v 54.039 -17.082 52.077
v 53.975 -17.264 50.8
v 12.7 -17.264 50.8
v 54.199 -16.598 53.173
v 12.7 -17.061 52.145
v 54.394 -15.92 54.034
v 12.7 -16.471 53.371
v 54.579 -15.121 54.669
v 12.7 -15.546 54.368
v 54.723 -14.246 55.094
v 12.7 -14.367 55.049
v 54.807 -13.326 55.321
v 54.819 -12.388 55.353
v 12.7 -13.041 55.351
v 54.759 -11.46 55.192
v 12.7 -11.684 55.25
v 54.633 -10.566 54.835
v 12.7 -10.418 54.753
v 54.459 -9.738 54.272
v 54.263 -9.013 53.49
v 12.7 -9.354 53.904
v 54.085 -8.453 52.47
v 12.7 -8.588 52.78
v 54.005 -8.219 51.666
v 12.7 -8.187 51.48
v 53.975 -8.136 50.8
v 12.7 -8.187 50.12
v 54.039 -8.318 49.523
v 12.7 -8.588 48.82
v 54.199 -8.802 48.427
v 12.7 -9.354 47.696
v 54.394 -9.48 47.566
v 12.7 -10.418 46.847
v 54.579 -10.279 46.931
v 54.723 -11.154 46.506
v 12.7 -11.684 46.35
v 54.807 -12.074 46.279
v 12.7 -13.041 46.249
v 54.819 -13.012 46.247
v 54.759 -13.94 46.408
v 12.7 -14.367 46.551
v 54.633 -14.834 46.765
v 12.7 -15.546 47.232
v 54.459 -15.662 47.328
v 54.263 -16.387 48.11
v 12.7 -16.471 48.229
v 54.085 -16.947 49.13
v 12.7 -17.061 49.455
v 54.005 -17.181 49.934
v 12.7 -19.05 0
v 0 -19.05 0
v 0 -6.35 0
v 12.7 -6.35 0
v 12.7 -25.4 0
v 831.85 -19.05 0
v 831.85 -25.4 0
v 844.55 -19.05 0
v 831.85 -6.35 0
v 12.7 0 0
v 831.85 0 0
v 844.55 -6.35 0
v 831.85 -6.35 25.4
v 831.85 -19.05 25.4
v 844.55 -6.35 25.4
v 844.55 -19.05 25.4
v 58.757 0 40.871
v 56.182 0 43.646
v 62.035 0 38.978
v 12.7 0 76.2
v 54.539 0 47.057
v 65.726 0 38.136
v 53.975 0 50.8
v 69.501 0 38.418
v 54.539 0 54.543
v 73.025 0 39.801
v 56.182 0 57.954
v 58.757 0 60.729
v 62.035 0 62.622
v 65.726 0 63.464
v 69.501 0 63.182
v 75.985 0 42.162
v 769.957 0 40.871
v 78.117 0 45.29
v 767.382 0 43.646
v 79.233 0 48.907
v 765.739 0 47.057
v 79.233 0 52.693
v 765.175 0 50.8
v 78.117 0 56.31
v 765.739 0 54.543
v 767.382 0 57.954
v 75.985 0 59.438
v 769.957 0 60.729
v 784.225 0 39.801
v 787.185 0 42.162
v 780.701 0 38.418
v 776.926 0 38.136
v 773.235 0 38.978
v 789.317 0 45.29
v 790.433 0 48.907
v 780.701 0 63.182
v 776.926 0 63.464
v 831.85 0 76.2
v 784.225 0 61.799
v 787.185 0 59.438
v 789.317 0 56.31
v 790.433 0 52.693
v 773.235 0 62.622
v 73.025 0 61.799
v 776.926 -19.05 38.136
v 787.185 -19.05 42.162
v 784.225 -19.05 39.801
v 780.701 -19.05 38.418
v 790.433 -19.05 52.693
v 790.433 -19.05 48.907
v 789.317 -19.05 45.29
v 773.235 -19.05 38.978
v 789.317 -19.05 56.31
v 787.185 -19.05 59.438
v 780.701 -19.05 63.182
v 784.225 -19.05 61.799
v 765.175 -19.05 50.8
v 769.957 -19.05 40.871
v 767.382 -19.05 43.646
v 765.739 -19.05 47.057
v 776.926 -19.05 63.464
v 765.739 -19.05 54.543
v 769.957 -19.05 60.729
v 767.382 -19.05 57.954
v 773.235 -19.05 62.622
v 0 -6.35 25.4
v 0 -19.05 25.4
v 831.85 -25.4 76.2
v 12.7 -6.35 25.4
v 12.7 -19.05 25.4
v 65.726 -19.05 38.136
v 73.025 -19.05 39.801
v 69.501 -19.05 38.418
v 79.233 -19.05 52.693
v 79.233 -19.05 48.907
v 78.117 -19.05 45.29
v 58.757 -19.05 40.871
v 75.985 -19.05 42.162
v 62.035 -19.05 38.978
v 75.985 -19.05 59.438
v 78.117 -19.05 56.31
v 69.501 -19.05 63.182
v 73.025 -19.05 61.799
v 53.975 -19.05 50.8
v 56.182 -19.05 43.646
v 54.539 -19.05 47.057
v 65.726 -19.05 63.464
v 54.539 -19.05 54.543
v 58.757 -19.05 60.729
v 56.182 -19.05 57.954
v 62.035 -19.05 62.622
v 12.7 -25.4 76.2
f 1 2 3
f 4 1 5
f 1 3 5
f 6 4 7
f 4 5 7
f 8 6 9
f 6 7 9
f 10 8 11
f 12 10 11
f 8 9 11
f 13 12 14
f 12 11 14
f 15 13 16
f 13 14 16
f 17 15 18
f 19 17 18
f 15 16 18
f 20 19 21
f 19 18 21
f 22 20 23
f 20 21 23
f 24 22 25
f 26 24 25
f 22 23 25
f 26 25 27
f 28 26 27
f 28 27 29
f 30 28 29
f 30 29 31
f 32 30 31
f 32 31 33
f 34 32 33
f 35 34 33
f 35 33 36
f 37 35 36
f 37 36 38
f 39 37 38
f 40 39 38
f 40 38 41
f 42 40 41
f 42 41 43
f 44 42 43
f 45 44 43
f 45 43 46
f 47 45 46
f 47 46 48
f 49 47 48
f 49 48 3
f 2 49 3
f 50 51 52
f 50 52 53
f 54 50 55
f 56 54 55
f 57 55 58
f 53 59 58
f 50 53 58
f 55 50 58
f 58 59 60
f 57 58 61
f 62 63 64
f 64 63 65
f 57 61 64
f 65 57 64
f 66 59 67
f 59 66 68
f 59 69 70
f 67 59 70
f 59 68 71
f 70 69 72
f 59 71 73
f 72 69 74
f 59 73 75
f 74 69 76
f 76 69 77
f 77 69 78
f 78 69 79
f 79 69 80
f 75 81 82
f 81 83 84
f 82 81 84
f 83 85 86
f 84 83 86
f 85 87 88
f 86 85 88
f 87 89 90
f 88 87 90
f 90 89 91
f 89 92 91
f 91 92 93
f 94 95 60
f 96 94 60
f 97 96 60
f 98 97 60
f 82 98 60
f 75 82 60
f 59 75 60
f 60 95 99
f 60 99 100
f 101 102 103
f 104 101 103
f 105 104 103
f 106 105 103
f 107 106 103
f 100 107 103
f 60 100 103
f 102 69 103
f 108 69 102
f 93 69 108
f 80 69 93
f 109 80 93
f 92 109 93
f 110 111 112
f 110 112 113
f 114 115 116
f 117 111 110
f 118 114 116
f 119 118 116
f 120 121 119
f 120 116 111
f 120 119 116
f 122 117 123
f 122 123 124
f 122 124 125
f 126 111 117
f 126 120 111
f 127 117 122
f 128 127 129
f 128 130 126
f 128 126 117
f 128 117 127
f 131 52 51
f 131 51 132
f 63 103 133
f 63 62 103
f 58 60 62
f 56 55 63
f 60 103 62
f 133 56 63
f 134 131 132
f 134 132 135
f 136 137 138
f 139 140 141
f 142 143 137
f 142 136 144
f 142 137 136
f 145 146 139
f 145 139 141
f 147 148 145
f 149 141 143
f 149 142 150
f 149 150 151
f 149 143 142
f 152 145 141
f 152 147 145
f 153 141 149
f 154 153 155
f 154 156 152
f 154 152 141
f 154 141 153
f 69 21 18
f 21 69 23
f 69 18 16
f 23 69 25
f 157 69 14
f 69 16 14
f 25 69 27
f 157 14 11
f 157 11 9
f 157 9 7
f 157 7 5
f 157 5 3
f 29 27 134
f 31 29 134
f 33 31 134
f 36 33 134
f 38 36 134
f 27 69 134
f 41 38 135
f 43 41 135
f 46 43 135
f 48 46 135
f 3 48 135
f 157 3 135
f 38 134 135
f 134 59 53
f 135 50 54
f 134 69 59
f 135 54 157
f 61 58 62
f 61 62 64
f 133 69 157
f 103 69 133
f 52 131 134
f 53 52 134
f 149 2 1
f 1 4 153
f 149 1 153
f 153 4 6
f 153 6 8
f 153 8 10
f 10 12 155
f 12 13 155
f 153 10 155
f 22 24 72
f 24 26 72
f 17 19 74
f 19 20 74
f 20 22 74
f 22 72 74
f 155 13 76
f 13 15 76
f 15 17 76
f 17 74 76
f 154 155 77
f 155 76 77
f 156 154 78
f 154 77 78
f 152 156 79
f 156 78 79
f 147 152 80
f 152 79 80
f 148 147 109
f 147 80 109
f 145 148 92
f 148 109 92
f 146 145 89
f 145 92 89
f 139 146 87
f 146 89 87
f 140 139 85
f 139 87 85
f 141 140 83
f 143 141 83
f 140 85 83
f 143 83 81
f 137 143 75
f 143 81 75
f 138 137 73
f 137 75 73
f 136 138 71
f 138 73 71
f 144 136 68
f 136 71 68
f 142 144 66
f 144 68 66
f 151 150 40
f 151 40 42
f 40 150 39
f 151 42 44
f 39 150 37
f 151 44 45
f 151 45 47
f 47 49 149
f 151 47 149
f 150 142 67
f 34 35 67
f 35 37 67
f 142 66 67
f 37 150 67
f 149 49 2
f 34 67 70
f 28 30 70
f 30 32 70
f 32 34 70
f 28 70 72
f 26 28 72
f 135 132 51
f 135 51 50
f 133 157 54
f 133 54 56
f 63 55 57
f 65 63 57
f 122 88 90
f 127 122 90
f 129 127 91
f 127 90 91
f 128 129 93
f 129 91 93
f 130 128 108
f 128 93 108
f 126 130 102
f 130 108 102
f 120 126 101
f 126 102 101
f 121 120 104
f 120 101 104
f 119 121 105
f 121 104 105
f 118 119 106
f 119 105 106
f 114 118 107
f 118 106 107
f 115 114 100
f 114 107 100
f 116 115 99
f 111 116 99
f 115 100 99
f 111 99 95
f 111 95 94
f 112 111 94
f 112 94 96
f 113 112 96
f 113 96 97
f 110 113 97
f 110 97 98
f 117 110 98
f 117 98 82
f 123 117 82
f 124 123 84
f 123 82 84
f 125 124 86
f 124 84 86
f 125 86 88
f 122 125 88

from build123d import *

# Parameters (mm, degrees)
F0_W     = 844.55
F0_H     = 76.2
F1_DEPTH = 25.4
F2_W     = 12.7
F2_H     = 50.8
F3_DEPTH = 25.401
F4_W     = 12.7
F4_H     = 6.35
F5_DEPTH = 76.201
F6_R     = 4.564063
F7_DEPTH = 50.8
F8_R     = 12.7
F9_DEPTH = 19.05


with BuildPart() as f1:
    # F0 (on Front) → F1 (new body)
    with BuildSketch(Plane.XZ):
        with Locations((422.275, 38.1)):
            Rectangle(F0_W, F0_H)
    extrude(amount=F1_DEPTH)

    # F2 (on face) → F3 (cut, through all)
    with BuildSketch(Plane.XZ.offset(25.4)):
        with Locations((6.35, 50.8)):
            Rectangle(F2_W, F2_H)
        with Locations((838.2, 50.8)):
            Rectangle(F2_W, F2_H)
    extrude(amount=-F3_DEPTH, mode=Mode.SUBTRACT)

    # F4 (on face) → F5 (cut, through all)
    with BuildSketch(Plane(origin=(0, 0, 0), x_dir=(1, 0, 0), z_dir=(0, 0, -1))):
        with Locations((838.2, 22.225)):
            Rectangle(F4_W, F4_H)
        with Locations((838.2, 3.175)):
            Rectangle(F4_W, F4_H)
        with Locations((6.35, 22.225)):
            Rectangle(F4_W, F4_H)
        with Locations((6.35, 3.175)):
            Rectangle(F4_W, F4_H)
    extrude(amount=-F5_DEPTH, mode=Mode.SUBTRACT)

    # F6 (on face) → F7 (cut)
    with BuildSketch(Plane(origin=(12.7, 0, 0), x_dir=(0, -1, 0), z_dir=(-1, 0, 0))):
        with Locations((12.7, 50.8)):
            Circle(F6_R)
    extrude(amount=-F7_DEPTH, mode=Mode.SUBTRACT)

    # F8 (on face) → F9 (cut)
    with BuildSketch(Plane(origin=(0, 0, 0), x_dir=(-1, 0, 0), z_dir=(0, 1, 0))):
        with Locations((-66.675, 50.8)):
            Circle(F8_R)
        with Locations((-777.875, 50.8)):
            Circle(F8_R)
    extrude(amount=-F9_DEPTH, mode=Mode.SUBTRACT)


solid = f1.part
